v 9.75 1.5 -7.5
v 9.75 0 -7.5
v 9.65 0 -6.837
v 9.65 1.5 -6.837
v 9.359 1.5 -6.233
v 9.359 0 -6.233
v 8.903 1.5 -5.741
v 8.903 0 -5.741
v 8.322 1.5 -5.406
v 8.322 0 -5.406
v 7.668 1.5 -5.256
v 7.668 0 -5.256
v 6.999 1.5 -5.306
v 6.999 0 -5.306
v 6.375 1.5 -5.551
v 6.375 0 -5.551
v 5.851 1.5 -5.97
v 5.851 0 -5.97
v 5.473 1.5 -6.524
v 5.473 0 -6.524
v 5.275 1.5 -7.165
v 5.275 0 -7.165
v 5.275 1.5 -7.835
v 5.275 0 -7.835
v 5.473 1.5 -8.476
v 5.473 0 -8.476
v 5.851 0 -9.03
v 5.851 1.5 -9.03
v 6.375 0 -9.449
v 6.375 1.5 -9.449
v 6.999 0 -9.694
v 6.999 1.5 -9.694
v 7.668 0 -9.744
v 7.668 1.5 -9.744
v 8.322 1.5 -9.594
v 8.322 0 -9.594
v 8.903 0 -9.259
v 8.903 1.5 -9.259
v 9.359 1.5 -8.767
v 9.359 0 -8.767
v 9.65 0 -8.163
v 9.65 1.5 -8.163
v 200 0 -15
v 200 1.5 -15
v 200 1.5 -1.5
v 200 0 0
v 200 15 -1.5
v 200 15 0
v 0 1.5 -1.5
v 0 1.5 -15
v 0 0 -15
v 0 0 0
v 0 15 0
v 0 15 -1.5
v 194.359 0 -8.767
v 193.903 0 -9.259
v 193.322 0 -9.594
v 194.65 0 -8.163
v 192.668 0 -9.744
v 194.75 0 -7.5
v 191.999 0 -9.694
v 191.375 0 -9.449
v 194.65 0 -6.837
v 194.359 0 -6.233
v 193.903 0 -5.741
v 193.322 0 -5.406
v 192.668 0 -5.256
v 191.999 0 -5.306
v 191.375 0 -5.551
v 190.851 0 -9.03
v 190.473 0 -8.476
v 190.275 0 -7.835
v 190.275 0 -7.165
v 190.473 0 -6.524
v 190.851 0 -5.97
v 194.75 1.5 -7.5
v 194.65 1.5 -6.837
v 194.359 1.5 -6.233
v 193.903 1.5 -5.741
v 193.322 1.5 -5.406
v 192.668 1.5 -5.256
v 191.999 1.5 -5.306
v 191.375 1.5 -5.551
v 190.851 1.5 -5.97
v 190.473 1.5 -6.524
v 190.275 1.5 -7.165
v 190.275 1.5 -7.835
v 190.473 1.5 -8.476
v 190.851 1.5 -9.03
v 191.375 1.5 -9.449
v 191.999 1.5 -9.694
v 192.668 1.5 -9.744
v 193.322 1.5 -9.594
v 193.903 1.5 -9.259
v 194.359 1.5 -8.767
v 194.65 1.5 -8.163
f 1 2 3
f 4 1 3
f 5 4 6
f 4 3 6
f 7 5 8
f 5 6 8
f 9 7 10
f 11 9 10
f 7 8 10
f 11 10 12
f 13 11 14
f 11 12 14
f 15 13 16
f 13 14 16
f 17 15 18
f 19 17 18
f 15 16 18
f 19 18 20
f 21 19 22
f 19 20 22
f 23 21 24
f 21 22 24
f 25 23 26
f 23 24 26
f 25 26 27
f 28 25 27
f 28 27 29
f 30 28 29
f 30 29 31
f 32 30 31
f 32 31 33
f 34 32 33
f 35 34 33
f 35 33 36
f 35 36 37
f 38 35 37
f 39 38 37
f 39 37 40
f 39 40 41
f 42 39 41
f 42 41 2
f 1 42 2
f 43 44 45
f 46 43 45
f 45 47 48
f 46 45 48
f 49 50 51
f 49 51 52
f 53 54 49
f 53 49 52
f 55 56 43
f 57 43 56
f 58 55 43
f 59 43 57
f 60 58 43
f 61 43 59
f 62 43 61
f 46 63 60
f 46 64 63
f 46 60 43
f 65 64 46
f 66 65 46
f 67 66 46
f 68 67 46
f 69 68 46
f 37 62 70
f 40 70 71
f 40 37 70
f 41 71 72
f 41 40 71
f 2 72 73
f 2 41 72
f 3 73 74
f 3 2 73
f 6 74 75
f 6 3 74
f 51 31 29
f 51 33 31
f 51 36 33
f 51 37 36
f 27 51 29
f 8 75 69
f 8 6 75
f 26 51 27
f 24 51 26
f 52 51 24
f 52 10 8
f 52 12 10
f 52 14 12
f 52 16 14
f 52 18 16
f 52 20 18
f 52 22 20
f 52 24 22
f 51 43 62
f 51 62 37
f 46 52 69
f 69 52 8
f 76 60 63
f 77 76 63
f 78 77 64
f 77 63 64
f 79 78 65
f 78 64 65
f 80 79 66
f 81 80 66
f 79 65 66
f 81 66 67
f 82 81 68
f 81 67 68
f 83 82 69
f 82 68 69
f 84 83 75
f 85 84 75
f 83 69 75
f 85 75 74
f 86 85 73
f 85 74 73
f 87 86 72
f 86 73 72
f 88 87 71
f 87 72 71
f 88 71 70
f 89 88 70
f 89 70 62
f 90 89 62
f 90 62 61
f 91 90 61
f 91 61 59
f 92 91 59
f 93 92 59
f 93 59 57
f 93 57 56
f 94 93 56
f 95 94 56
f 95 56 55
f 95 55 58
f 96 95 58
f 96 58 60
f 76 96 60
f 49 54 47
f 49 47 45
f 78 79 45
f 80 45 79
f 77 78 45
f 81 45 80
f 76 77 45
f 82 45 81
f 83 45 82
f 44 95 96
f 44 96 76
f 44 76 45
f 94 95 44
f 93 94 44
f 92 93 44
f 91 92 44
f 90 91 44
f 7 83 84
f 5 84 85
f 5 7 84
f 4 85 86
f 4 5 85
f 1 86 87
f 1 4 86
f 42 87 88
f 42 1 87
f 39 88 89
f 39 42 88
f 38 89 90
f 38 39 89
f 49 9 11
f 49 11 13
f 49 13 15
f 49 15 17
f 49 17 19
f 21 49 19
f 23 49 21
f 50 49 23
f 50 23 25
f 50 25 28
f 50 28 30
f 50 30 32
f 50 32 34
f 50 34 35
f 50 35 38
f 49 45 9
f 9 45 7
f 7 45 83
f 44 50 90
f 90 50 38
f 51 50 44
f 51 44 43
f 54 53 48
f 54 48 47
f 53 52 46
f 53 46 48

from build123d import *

# Parameters (mm, degrees)
EXTRUDE_1_DEPTH     = 200
SKETCH_2_R          = 2.25
CUT_EXTRUDE_1_DEPTH = 16


with BuildPart() as part:
    # Эскиз1 → Бобышка-Вытянуть1 (new body)
    with BuildSketch(Plane(origin=(0, 0, 0), x_dir=(0, 0, -1), z_dir=(1, 0, 0))):
        Polygon((0, 0), (0, 15), (1.5, 15), (1.5, 1.5), (15, 1.5), (15, 0), align=None)
    extrude(amount=EXTRUDE_1_DEPTH)

    # Эскиз2 → Вырез-Вытянуть1 (cut, through all)
    with BuildSketch(Plane.XZ):
        with Locations((7.5, -7.5)):
            Circle(SKETCH_2_R)
        with Locations((192.5, -7.5)):
            Circle(SKETCH_2_R)
    extrude(amount=-CUT_EXTRUDE_1_DEPTH, mode=Mode.SUBTRACT)


solid = part.part
